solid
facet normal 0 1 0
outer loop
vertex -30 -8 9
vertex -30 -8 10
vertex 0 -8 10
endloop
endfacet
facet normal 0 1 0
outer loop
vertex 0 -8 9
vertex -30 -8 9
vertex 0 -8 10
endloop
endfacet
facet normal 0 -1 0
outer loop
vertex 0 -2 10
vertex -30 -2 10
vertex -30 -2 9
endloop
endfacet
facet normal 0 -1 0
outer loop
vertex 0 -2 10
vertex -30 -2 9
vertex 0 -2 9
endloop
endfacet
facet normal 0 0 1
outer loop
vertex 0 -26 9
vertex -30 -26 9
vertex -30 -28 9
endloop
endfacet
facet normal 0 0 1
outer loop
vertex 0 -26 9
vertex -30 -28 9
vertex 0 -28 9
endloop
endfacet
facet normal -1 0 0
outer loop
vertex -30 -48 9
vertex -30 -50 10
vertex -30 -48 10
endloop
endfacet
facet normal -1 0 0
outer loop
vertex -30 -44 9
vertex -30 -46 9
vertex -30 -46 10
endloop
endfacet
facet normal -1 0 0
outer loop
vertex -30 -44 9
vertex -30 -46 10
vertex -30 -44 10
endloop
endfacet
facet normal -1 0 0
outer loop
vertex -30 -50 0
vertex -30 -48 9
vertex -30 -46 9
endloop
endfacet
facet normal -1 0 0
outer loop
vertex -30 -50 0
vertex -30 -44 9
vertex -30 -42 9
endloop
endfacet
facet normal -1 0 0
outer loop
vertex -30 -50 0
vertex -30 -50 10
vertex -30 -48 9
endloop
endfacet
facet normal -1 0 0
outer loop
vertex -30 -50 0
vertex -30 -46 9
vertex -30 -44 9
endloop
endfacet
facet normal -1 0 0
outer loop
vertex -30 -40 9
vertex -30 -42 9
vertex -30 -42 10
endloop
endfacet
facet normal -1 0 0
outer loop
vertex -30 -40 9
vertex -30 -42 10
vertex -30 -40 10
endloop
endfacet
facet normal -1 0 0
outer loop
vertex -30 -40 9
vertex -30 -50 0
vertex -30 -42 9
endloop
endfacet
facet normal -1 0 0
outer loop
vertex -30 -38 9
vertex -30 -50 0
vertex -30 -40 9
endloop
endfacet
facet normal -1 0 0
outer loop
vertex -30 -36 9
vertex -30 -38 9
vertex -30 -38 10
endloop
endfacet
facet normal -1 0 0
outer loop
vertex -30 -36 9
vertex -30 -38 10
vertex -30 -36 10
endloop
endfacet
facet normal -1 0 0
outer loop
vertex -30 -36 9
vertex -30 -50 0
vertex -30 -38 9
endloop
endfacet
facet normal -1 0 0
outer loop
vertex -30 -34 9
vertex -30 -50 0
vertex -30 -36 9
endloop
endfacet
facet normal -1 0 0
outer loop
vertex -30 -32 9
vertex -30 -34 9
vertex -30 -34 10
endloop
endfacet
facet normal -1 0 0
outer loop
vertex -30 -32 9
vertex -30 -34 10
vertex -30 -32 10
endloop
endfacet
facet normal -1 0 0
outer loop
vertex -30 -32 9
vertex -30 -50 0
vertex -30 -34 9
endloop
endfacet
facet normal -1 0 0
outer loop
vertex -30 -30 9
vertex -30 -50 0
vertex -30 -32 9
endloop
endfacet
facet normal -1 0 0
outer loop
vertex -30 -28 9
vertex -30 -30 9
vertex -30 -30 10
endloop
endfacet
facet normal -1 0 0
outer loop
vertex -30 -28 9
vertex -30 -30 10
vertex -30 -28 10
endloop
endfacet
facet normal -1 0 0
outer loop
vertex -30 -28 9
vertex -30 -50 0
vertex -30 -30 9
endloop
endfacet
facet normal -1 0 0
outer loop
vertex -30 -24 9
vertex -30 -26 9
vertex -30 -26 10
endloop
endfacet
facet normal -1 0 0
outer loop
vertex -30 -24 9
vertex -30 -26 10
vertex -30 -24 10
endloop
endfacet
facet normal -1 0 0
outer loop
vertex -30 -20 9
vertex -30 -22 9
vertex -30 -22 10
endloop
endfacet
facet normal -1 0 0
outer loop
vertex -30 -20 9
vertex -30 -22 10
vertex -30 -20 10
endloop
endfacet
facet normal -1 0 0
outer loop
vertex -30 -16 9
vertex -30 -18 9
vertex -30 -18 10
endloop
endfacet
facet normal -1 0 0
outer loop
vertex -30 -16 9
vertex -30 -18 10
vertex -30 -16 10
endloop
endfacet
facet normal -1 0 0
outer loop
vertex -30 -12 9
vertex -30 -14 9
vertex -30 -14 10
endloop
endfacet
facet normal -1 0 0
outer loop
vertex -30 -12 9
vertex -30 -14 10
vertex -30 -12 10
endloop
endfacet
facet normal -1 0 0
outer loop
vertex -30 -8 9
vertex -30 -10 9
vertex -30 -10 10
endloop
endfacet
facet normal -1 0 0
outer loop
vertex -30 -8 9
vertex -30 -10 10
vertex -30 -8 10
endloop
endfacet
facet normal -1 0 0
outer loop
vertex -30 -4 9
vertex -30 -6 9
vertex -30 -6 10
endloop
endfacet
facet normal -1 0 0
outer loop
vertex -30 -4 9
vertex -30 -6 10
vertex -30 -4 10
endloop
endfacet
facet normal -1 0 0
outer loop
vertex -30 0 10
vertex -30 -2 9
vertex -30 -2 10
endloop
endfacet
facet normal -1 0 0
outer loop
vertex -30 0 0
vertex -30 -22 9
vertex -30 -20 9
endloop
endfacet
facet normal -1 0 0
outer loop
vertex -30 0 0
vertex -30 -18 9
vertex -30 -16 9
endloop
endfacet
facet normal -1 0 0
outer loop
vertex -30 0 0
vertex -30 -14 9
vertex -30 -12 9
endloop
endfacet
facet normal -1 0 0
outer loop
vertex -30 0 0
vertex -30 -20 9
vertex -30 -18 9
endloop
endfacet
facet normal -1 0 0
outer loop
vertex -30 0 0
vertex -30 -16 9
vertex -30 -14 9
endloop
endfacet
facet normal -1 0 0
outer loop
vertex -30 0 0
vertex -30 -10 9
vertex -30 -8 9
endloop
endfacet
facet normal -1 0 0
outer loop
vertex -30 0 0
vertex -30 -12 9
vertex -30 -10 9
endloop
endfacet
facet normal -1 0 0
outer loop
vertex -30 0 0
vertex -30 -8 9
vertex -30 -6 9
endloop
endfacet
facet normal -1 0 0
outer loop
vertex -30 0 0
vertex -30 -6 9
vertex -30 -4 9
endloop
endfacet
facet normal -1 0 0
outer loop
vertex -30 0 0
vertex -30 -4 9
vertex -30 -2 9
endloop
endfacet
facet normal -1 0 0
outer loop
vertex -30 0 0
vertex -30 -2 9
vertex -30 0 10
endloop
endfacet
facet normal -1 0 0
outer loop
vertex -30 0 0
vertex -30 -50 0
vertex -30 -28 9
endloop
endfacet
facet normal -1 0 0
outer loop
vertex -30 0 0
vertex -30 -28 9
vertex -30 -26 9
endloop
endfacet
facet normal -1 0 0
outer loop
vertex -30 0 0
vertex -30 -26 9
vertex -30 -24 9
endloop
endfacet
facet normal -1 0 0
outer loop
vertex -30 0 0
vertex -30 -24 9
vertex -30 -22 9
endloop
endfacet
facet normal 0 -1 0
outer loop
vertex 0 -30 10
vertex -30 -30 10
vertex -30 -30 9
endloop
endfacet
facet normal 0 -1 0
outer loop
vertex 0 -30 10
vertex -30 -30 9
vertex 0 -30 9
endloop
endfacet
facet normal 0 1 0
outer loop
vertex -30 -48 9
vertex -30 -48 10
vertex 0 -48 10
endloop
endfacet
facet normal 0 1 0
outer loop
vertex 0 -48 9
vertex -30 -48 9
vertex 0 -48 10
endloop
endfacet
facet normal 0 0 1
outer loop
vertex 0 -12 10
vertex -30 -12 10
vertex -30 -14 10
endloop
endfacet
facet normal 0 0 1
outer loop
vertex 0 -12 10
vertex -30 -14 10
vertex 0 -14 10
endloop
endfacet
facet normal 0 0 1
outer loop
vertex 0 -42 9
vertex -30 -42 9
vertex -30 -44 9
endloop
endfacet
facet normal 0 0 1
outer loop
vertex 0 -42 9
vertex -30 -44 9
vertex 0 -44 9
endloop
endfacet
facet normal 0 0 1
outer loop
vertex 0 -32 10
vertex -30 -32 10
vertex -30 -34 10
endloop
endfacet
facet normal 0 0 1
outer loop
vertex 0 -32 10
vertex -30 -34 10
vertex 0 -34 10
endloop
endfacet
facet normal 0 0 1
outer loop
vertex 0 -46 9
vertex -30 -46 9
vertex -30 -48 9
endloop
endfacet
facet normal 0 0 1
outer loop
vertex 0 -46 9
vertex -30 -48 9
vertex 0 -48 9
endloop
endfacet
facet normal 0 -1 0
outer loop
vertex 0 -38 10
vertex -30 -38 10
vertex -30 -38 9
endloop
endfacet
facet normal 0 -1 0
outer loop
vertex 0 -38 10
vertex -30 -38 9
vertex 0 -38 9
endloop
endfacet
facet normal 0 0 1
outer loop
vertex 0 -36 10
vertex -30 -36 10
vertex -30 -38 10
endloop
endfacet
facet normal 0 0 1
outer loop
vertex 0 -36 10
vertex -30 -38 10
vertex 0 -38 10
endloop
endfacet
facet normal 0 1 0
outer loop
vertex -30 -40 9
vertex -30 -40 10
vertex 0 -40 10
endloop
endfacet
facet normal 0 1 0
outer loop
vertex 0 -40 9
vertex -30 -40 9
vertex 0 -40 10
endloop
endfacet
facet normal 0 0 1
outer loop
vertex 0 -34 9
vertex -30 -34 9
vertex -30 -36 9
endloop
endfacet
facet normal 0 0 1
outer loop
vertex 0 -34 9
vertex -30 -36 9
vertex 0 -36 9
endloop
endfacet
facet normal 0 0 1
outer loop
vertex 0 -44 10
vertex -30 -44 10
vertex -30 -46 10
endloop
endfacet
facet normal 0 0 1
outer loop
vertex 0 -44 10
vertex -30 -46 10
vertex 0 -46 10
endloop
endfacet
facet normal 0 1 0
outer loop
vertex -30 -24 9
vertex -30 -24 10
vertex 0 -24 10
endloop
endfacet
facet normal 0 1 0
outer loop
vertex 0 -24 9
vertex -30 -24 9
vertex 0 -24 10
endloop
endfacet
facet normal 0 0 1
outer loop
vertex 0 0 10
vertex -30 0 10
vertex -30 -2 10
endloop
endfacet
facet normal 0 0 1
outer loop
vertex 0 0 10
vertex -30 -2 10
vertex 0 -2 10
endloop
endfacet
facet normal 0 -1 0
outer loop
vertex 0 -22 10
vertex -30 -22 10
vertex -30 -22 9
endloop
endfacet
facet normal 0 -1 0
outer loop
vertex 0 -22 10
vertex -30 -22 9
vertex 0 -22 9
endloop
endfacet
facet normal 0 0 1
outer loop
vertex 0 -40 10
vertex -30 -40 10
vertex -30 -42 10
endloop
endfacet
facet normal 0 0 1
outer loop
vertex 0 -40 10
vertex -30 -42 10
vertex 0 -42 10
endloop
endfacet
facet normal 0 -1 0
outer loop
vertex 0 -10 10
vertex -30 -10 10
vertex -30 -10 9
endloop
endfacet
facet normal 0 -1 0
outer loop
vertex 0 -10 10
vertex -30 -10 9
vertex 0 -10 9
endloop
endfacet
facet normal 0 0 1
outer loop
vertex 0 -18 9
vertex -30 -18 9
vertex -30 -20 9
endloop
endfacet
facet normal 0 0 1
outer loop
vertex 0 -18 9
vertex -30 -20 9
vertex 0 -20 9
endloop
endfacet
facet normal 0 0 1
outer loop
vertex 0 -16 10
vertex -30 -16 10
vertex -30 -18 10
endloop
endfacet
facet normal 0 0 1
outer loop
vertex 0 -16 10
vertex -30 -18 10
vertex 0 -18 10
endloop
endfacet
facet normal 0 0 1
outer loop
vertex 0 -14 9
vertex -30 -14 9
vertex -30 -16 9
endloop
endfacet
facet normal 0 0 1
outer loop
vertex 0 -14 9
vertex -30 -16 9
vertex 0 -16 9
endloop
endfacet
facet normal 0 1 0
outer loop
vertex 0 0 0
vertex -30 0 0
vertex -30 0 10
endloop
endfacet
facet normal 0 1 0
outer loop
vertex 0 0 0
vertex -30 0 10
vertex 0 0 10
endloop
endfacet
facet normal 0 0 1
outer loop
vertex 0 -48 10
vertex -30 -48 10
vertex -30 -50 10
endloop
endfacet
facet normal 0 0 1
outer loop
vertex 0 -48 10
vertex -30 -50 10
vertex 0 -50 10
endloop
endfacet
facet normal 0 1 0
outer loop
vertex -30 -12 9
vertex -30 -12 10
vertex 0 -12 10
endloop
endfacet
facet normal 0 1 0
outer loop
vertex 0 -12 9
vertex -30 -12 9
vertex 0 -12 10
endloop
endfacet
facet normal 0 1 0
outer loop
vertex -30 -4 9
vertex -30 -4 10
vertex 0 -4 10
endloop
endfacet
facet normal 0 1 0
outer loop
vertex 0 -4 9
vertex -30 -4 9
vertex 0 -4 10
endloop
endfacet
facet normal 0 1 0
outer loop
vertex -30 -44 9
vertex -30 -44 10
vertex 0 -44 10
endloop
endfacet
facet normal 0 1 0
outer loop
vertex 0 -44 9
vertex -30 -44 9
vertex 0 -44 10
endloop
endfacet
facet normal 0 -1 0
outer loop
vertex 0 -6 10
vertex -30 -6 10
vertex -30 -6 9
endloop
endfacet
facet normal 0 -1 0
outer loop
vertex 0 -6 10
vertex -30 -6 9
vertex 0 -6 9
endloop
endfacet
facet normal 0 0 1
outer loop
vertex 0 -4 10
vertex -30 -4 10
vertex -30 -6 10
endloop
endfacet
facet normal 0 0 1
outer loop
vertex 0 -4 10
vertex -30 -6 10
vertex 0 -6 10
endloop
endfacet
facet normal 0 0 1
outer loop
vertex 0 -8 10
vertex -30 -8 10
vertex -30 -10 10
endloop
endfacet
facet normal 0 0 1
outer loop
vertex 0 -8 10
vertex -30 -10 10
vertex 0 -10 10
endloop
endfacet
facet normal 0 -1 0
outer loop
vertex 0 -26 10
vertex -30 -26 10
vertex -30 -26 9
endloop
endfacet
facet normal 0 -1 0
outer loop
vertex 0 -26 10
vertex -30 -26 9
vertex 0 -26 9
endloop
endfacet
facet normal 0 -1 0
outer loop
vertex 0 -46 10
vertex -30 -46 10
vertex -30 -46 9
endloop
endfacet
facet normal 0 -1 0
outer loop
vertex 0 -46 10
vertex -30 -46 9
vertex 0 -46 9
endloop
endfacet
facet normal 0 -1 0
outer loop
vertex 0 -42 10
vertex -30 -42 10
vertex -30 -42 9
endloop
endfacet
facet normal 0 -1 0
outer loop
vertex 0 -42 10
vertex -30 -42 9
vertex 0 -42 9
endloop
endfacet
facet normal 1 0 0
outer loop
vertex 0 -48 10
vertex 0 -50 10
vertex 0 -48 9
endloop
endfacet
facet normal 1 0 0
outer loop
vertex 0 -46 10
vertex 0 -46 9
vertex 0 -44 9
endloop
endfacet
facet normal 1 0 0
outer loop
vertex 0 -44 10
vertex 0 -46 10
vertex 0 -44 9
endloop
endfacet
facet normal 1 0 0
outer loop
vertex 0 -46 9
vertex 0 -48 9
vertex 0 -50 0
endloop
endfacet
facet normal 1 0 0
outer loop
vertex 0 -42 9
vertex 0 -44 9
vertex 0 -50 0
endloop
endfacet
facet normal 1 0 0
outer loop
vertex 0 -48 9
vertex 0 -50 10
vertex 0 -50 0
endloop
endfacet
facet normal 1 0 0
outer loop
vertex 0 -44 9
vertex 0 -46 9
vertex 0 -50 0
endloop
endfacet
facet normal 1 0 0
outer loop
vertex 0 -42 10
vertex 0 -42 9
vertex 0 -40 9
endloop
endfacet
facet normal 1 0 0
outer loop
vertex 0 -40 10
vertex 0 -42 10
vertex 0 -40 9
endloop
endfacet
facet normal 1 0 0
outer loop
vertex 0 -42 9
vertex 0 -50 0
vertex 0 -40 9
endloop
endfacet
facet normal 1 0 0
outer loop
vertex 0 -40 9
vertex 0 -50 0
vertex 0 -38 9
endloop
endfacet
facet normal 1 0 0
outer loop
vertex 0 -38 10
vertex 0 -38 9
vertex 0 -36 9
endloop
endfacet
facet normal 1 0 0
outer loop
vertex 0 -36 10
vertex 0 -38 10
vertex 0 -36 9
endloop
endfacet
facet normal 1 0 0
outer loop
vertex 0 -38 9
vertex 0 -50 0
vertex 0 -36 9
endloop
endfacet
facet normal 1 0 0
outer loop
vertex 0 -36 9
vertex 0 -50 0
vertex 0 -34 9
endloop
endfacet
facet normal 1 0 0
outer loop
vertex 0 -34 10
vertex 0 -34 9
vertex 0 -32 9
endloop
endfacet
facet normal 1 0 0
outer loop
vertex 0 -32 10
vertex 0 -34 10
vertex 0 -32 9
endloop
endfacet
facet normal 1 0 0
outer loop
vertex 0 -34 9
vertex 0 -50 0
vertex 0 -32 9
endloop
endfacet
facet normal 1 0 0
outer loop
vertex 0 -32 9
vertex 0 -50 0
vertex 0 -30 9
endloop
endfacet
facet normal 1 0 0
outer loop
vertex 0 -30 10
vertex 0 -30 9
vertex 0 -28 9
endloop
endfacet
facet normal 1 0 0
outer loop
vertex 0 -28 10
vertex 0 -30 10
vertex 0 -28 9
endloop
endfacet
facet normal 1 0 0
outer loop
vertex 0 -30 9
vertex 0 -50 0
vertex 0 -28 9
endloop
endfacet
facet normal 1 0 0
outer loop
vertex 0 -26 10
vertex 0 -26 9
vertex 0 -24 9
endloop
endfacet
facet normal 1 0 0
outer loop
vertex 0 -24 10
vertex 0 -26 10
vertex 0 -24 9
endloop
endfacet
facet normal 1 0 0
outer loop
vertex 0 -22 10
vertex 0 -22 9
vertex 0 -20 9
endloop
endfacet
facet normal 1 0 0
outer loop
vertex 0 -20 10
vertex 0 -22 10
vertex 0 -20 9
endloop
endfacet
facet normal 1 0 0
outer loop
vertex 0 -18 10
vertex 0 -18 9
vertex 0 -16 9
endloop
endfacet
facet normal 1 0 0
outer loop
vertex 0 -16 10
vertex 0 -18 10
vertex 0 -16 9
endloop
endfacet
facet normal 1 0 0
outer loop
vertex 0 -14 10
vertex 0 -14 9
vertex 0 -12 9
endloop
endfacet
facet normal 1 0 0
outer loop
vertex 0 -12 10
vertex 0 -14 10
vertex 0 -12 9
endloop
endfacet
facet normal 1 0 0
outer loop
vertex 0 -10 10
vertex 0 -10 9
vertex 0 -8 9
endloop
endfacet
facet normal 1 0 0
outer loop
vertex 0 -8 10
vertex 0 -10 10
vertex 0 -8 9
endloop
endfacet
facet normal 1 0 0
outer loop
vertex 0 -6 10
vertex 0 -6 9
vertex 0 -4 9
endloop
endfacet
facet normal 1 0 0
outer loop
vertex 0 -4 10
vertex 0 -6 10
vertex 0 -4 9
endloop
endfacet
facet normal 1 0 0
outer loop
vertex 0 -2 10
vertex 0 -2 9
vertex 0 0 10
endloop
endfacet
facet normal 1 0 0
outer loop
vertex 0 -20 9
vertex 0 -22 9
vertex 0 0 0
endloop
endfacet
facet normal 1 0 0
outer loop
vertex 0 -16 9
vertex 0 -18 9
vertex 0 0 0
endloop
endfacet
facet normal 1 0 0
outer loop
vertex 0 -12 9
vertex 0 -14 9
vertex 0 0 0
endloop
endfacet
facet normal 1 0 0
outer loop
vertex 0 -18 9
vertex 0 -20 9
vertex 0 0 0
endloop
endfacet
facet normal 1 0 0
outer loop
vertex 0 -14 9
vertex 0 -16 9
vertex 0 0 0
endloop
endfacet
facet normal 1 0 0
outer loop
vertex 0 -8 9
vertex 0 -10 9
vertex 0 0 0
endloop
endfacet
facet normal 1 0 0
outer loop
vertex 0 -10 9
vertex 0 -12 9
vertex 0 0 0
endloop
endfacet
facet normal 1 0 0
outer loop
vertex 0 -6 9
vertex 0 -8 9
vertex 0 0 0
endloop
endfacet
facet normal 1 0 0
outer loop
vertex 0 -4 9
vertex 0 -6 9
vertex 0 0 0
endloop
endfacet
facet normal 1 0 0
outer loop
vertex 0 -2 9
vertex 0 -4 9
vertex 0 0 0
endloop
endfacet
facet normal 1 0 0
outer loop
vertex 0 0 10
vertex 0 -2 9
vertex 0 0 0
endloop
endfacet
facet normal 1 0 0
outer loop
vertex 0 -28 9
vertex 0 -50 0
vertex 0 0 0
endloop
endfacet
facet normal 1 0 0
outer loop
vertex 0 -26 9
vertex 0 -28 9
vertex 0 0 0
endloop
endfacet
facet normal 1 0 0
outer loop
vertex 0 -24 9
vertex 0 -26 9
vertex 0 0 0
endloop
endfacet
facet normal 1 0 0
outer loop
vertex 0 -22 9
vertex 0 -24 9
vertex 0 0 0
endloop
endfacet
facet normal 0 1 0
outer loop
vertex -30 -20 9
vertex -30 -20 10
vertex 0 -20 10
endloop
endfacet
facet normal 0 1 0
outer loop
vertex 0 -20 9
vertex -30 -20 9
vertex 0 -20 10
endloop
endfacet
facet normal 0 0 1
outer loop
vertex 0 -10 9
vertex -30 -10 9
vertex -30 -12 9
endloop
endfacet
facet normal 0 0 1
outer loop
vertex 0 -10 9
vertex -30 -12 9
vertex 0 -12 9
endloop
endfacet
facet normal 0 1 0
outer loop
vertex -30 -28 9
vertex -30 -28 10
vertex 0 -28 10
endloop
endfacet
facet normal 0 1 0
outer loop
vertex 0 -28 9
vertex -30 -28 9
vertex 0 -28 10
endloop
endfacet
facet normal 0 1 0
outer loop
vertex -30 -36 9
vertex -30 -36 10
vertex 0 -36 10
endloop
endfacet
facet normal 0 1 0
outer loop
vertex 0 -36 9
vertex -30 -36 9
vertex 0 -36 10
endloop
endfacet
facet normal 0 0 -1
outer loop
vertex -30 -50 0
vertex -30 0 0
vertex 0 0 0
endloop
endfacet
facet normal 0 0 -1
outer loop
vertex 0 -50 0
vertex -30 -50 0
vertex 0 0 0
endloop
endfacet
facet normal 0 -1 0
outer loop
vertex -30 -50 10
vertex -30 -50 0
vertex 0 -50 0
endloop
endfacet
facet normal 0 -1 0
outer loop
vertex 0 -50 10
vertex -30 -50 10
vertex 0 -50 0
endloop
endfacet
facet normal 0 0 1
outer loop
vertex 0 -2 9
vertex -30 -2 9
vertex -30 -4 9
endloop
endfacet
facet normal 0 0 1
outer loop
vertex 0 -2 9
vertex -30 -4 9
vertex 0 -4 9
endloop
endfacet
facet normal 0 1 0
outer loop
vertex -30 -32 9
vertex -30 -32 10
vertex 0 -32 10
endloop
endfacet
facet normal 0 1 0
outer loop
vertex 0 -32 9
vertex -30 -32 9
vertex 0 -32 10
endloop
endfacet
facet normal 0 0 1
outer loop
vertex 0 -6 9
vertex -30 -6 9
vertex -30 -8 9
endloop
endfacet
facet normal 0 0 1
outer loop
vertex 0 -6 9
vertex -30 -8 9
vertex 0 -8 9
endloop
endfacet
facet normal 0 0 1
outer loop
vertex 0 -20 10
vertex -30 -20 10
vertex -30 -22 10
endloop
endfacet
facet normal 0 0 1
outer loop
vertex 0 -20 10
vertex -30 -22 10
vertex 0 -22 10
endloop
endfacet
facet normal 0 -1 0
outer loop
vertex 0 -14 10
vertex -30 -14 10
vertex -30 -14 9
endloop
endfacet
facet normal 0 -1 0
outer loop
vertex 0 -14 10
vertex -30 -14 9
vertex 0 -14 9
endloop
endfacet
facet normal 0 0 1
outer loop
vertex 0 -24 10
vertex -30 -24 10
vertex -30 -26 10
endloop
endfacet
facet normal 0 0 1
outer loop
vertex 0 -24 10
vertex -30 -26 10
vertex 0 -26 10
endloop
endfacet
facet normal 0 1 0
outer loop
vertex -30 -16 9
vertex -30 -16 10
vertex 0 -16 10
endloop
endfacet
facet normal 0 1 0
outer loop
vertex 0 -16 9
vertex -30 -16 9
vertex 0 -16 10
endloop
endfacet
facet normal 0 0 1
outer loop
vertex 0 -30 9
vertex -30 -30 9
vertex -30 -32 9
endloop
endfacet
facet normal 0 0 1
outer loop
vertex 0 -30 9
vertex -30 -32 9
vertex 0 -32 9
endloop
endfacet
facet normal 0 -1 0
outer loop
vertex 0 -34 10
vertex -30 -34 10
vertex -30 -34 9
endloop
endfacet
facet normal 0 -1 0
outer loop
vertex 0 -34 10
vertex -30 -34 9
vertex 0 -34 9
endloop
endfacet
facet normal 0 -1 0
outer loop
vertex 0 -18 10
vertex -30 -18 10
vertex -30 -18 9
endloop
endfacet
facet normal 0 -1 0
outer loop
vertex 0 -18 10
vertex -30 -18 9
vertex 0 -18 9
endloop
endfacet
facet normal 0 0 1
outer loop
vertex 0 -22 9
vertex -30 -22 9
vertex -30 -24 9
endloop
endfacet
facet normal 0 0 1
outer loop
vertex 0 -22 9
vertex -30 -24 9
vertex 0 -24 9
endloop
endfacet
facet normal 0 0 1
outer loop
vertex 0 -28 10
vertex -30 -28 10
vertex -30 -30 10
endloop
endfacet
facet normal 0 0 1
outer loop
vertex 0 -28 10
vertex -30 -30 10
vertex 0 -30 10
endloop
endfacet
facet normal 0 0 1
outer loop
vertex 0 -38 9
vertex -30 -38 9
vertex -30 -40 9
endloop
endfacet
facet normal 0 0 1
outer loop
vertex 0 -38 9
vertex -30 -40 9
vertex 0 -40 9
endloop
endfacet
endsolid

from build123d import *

# Parameters (mm, degrees)
SKETCH1_W           = 30
SKETCH1_H           = 50
BOSS_EXTRUDE1_DEPTH = 10
SKETCH2_W           = 30
SKETCH2_H           = 2
CUT_EXTRUDE3_DEPTH  = 1


with BuildPart() as part:
    # Sketch1 → Boss-Extrude1 (new body)
    with BuildSketch(Plane.XY):
        with Locations((-15, -25)):
            Rectangle(SKETCH1_W, SKETCH1_H)
    extrude(amount=BOSS_EXTRUDE1_DEPTH)

    # Sketch2 → Cut-Extrude3 (cut)
    with BuildSketch(Plane.XY.offset(10)):
        with Locations((-15, -3)):
            Rectangle(SKETCH2_W, SKETCH2_H)
        with Locations((-15, -7)):
            Rectangle(SKETCH2_W, SKETCH2_H)
        with Locations((-15, -11)):
            Rectangle(SKETCH2_W, SKETCH2_H)
        with Locations((-15, -15)):
            Rectangle(SKETCH2_W, SKETCH2_H)
        with Locations((-15, -19)):
            Rectangle(SKETCH2_W, SKETCH2_H)
        with Locations((-15, -23)):
            Rectangle(SKETCH2_W, SKETCH2_H)
        with Locations((-15, -27)):
            Rectangle(SKETCH2_W, SKETCH2_H)
        with Locations((-15, -31)):
            Rectangle(SKETCH2_W, SKETCH2_H)
        with Locations((-15, -35)):
            Rectangle(SKETCH2_W, SKETCH2_H)
        with Locations((-15, -39)):
            Rectangle(SKETCH2_W, SKETCH2_H)
        with Locations((-15, -43)):
            Rectangle(SKETCH2_W, SKETCH2_H)
        with Locations((-15, -47)):
            Rectangle(SKETCH2_W, SKETCH2_H)
    extrude(amount=-CUT_EXTRUDE3_DEPTH, mode=Mode.SUBTRACT)


solid = part.part
